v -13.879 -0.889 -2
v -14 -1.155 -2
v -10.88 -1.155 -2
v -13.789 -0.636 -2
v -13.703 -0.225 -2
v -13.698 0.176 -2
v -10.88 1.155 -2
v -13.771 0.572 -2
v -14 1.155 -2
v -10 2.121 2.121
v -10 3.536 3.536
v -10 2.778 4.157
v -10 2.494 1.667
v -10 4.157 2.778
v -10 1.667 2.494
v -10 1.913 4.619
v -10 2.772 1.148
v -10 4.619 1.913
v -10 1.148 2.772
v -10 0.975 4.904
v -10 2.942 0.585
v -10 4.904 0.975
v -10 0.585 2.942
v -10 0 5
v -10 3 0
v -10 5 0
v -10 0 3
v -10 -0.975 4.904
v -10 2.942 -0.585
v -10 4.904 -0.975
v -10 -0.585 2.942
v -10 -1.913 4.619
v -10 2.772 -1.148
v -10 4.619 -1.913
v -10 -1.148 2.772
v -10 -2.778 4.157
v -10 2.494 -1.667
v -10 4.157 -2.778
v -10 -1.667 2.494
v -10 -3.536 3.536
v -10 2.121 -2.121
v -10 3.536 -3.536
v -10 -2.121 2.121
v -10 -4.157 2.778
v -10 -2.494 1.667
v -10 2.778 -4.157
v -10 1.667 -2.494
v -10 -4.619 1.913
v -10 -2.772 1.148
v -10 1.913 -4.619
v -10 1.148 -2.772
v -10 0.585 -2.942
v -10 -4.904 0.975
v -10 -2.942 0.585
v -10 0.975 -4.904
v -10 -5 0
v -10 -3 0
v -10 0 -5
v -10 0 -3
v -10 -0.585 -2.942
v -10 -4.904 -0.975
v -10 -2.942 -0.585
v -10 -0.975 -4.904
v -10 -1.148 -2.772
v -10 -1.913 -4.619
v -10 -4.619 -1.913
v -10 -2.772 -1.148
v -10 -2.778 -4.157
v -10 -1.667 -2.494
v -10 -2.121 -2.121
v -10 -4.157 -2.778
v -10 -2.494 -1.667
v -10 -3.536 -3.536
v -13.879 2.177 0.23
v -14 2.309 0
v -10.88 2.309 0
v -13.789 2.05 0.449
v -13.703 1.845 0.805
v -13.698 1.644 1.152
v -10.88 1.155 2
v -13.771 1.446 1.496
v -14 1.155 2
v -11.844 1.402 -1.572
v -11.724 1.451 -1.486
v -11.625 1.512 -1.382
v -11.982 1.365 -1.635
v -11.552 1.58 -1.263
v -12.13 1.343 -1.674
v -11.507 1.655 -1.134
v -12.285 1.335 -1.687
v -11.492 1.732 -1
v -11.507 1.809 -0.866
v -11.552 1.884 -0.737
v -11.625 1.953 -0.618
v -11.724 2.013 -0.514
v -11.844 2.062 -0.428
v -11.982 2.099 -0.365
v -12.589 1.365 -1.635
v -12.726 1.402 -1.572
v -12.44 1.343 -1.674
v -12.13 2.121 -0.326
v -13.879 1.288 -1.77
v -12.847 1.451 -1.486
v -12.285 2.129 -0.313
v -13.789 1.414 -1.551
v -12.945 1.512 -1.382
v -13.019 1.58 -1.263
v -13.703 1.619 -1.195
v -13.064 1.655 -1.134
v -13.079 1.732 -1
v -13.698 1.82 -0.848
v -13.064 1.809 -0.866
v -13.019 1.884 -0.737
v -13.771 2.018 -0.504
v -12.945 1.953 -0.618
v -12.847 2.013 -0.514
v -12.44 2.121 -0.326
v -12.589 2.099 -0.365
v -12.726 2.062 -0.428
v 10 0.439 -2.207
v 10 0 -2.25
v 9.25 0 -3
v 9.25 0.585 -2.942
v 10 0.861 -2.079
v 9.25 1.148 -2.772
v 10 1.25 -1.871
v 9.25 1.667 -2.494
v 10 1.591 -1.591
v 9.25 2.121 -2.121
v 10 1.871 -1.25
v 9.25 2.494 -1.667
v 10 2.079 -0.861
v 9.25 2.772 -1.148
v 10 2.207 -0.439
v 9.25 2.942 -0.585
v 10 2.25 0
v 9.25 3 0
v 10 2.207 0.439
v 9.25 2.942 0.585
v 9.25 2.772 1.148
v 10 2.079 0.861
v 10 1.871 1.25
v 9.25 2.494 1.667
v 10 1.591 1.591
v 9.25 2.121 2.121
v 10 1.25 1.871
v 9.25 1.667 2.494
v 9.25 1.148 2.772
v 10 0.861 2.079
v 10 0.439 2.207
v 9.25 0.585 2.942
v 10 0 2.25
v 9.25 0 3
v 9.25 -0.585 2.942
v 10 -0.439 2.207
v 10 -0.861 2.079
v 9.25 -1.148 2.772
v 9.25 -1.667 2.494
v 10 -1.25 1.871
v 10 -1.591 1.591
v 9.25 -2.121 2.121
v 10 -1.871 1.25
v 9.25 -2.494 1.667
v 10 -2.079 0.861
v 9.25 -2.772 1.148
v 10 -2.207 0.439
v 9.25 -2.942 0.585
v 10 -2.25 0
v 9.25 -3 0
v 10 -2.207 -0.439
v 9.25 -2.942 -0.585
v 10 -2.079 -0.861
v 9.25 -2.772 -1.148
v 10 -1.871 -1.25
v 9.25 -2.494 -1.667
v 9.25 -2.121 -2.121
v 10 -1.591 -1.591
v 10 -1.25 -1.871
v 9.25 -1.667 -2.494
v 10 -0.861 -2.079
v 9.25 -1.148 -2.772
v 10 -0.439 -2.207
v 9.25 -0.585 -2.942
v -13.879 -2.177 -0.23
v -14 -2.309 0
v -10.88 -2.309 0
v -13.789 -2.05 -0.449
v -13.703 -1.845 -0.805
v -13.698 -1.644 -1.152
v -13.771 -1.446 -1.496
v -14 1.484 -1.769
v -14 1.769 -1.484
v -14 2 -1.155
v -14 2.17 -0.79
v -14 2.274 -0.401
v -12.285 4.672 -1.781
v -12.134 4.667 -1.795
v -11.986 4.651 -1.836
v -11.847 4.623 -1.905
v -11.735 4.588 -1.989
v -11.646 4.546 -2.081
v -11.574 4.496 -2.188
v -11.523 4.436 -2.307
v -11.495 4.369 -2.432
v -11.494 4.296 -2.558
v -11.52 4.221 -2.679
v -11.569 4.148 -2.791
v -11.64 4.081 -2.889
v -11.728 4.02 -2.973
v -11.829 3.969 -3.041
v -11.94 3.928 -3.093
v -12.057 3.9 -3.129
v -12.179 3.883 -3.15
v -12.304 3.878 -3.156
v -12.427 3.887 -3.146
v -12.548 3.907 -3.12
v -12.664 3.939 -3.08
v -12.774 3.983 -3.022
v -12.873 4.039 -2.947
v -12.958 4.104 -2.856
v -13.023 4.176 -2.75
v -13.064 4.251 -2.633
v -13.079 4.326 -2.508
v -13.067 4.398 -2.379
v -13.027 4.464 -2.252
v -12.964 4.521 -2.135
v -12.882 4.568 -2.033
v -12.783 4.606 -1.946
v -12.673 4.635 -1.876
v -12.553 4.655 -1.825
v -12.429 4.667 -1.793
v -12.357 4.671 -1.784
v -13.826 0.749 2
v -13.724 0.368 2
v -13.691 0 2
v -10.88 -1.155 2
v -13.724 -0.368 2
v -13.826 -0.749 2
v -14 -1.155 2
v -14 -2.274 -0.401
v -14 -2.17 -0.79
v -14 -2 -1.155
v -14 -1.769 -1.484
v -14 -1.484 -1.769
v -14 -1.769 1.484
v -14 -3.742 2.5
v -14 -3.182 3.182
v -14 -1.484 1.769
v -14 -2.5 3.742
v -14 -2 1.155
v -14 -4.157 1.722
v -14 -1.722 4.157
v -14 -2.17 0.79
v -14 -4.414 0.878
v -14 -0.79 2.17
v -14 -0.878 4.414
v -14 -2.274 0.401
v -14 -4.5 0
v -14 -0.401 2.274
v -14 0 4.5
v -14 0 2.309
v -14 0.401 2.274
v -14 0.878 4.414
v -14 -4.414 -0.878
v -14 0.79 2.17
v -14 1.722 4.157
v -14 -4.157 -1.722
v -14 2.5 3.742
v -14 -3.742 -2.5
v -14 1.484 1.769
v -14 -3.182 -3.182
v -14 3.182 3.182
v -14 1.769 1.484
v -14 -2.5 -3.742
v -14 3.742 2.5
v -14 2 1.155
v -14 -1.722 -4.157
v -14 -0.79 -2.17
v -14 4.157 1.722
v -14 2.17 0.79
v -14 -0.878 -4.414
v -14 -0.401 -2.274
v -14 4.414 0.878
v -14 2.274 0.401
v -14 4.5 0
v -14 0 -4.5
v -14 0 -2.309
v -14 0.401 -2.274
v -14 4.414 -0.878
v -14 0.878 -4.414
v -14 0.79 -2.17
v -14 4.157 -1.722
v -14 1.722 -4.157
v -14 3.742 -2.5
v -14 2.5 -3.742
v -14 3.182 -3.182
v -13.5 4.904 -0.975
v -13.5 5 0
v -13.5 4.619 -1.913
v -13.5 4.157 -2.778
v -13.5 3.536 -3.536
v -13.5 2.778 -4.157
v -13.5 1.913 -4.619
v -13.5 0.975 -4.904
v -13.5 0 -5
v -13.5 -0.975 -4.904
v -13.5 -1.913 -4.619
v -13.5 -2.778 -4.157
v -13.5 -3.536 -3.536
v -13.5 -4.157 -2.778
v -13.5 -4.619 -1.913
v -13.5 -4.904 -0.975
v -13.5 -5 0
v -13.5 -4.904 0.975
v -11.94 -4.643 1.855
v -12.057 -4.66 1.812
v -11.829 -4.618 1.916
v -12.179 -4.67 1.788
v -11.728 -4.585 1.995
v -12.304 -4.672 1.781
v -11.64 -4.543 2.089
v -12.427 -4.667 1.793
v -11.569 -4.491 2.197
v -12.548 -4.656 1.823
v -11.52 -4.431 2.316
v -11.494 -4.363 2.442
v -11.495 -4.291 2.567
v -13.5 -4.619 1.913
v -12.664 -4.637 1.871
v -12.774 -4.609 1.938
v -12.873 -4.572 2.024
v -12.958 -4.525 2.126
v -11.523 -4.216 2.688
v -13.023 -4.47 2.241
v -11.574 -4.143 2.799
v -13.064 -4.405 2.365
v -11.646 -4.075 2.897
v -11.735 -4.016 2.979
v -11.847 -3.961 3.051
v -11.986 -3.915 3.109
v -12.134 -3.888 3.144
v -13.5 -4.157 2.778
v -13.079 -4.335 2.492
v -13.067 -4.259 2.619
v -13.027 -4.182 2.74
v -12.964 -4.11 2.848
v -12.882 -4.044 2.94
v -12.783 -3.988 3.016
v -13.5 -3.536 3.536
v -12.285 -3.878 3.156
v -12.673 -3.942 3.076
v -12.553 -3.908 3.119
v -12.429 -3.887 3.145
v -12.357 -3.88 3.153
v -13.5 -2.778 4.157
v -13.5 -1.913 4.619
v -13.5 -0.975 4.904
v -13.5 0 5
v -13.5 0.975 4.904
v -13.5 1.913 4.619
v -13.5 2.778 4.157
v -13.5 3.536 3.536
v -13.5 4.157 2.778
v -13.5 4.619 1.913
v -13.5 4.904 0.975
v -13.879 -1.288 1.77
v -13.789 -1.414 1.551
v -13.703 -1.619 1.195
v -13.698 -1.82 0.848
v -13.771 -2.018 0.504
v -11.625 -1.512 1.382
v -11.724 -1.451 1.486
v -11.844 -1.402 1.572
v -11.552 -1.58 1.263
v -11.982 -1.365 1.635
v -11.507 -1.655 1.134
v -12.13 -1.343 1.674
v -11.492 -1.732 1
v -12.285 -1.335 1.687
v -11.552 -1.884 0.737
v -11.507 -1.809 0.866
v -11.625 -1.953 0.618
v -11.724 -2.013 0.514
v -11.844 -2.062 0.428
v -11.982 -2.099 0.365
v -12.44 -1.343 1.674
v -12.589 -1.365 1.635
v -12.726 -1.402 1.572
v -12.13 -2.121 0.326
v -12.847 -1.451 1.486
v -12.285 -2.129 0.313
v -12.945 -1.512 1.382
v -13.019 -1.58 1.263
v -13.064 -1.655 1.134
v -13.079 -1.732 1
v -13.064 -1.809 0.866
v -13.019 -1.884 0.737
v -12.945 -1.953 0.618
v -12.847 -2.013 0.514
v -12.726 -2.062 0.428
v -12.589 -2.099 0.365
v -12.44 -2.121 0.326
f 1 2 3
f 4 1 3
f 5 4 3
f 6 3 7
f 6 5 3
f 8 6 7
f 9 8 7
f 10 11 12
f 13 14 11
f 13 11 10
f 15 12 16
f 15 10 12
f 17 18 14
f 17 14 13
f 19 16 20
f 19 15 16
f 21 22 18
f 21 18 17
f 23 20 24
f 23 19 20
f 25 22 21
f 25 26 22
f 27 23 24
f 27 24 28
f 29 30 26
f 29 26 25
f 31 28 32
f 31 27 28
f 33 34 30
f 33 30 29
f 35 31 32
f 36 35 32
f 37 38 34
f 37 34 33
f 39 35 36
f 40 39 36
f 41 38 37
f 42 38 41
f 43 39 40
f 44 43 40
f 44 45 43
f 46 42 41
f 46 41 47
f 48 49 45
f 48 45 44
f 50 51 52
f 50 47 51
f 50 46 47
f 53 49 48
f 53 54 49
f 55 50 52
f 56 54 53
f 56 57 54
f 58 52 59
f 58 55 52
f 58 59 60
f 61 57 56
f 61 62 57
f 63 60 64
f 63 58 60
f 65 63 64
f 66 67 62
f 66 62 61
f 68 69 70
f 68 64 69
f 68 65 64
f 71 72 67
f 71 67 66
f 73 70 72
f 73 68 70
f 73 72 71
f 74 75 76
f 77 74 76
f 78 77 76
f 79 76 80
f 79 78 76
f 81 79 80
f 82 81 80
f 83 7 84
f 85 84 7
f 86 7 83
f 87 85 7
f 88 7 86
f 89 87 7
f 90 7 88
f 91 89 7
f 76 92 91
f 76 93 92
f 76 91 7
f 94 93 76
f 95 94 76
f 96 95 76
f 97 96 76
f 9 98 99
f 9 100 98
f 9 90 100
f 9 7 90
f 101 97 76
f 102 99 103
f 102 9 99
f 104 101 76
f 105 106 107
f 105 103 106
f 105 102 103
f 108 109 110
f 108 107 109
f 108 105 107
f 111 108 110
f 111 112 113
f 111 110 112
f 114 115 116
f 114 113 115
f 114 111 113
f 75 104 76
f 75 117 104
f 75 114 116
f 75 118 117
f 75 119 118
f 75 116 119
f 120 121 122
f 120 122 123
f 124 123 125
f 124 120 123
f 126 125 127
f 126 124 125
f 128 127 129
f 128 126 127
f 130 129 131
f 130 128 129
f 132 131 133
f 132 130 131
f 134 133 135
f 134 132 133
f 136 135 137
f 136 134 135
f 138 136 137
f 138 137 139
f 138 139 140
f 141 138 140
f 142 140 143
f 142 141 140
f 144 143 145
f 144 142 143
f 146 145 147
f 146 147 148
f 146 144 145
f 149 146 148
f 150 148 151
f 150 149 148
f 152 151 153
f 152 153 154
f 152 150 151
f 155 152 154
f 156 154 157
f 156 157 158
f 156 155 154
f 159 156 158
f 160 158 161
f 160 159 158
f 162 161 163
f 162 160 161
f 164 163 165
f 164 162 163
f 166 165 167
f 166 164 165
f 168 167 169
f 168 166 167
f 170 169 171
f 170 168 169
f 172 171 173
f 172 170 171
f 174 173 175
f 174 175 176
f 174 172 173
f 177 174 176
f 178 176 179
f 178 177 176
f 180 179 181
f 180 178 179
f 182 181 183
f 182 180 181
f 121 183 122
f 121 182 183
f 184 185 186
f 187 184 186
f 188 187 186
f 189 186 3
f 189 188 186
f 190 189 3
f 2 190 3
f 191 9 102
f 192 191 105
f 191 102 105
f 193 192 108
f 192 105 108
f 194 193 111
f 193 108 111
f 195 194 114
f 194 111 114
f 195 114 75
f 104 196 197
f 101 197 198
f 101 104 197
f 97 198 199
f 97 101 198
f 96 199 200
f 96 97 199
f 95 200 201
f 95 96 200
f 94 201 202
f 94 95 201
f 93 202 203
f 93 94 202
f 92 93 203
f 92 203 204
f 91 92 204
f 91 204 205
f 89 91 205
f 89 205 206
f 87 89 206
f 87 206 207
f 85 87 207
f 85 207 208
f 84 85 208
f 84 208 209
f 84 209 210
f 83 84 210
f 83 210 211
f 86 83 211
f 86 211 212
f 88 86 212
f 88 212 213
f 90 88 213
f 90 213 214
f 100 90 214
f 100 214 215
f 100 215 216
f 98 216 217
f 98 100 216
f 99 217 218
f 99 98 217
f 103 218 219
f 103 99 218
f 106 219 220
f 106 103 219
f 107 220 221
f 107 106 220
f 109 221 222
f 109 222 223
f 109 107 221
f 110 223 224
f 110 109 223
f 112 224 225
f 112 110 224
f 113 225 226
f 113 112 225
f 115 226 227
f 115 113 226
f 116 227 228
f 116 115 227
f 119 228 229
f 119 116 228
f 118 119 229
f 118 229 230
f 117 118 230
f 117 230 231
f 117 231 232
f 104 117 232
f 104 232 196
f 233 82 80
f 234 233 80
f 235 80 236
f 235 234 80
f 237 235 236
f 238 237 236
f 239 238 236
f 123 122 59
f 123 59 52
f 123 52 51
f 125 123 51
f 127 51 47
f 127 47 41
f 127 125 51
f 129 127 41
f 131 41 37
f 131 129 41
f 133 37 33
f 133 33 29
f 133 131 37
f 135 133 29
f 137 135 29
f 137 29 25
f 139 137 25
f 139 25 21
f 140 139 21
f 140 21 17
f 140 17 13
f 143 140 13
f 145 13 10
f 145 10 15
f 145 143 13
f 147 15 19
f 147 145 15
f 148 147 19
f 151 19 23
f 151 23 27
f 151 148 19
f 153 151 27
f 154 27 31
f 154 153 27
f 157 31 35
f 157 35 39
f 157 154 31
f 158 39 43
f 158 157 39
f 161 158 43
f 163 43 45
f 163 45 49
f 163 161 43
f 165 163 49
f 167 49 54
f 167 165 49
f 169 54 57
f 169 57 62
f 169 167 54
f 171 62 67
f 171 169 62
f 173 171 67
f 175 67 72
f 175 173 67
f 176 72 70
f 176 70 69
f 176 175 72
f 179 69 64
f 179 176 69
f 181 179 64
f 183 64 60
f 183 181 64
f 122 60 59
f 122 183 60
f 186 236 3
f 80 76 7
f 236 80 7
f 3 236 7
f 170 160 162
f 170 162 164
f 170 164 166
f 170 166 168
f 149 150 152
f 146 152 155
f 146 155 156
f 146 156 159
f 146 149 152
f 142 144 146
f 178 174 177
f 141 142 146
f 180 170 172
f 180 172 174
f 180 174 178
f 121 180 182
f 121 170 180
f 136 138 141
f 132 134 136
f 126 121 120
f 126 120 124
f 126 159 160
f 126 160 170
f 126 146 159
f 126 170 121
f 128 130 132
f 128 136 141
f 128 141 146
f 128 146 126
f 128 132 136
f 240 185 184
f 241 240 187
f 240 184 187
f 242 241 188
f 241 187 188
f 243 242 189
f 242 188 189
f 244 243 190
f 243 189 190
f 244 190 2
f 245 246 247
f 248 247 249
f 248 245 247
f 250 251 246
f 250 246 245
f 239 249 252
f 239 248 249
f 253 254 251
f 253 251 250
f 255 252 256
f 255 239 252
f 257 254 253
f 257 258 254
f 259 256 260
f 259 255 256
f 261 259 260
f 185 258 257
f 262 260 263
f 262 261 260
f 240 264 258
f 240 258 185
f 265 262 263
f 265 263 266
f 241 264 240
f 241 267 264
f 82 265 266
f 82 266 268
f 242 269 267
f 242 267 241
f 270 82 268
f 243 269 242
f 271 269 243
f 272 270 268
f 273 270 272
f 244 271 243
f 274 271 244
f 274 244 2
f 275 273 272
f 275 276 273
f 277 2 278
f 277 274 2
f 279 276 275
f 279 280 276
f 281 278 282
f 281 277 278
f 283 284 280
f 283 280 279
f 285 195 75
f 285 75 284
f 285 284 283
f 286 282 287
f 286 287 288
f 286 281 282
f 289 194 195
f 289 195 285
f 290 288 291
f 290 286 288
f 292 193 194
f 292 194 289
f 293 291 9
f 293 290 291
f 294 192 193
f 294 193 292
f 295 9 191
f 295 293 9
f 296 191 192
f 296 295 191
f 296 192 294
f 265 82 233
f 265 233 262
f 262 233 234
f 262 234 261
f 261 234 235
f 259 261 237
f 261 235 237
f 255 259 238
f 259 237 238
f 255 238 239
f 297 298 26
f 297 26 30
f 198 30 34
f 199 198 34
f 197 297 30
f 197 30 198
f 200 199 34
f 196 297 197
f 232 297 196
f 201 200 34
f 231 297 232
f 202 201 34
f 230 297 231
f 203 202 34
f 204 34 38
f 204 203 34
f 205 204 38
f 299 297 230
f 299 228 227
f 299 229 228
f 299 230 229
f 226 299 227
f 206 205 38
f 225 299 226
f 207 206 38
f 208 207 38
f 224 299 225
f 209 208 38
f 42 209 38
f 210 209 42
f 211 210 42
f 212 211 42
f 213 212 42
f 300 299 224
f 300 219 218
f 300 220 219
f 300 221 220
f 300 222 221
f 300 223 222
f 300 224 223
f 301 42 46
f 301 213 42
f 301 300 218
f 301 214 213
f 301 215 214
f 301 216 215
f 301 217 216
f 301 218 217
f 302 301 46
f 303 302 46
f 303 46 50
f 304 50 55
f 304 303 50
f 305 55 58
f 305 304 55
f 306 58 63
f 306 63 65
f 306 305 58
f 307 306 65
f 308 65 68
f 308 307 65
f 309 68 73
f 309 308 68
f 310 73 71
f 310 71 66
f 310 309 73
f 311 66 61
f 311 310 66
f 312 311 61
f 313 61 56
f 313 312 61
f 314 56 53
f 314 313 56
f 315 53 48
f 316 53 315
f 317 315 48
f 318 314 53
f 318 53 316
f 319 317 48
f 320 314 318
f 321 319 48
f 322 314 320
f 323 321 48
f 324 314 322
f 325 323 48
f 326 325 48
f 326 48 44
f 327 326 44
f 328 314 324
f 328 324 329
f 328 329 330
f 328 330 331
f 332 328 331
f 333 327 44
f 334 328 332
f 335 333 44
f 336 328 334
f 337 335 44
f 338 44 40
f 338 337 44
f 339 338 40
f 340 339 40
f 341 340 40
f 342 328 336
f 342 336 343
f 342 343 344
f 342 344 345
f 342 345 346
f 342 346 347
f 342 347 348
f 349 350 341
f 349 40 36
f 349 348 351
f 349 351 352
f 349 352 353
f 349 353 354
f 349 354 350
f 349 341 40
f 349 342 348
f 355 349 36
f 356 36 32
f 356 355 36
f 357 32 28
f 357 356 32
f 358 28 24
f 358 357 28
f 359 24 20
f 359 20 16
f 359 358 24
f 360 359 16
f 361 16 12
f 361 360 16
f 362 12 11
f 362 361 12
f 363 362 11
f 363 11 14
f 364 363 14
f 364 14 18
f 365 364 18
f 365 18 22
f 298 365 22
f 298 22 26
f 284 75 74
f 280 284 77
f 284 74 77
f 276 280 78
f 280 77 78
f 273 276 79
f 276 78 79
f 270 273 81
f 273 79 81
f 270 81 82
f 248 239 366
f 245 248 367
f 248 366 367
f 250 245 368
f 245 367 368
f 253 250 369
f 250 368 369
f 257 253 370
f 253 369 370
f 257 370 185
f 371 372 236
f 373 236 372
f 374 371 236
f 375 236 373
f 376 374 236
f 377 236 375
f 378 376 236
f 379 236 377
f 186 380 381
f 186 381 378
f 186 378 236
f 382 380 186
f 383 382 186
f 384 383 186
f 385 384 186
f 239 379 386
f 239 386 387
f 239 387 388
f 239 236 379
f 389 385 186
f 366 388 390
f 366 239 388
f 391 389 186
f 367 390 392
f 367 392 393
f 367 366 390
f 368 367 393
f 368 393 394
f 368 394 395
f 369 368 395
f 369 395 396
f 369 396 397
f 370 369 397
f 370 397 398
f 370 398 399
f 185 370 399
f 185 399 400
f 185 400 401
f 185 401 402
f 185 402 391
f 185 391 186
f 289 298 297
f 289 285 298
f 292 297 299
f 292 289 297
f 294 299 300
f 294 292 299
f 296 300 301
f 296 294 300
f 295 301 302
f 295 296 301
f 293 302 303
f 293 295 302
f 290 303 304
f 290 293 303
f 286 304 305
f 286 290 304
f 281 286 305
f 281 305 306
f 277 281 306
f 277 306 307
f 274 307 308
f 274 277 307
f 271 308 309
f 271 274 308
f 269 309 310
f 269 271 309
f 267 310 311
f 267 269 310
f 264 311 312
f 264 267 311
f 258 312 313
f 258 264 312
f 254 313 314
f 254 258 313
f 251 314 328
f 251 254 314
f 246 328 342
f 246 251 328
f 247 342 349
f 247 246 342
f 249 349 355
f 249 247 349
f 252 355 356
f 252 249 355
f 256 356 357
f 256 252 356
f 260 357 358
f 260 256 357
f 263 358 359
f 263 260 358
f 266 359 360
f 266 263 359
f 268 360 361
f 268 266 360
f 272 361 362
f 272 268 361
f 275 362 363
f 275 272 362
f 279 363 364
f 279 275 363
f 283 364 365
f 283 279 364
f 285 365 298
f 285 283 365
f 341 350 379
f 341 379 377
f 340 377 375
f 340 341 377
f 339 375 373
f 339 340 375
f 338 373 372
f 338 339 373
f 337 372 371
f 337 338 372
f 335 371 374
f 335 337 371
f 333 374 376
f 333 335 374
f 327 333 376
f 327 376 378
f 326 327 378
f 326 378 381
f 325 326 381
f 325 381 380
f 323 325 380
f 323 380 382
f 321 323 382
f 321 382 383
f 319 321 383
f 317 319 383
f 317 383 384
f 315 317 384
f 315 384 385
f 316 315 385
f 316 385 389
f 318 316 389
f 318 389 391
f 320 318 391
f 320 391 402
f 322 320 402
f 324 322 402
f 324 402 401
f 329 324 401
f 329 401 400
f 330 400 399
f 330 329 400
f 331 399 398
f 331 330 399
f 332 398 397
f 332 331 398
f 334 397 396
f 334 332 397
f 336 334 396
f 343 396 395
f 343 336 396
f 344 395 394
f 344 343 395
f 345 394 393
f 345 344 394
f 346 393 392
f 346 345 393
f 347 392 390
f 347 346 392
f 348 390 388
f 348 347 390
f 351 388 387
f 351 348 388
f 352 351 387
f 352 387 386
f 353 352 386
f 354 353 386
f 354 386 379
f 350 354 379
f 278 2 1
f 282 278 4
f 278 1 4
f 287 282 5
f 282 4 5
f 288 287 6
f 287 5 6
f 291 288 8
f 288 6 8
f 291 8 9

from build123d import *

# Parameters (mm, degrees)
SKETCH2_R               = 3
BOSS_EXTRUDE1_DEPTH     = 20
CHAMFER1_SIZE           = 0.75
CUT_EXTRUDE1_DEPTH      = 3.12
CUT_EXTRUDE3_DEPTH      = 17.652942925
CUT_EXTRUDE3_DEPTH_BACK = 17.652942925
SKETCH9_R               = 0.79375


with BuildPart() as part:
    # Sketch2 → Boss-Extrude1 (new body)
    with BuildSketch(Plane(origin=(10, 0, 0), x_dir=(0, 0, -1), z_dir=(1, 0, 0))):
        Circle(SKETCH2_R)
    extrude(amount=-BOSS_EXTRUDE1_DEPTH)

    # Chamfer1
    chamfer1_edges = [part.edges().sort_by_distance(p)[0] for p in [
        (10, 0, 3),
    ]]
    chamfer(chamfer1_edges, length=CHAMFER1_SIZE)

    # Sketch6 → Revolve1 (revolve)
    with BuildSketch(Plane.XY):
        Polygon((-13.5, 5), (-14, 4.5), (-14, 0), (-10, 0), (-10, 5), align=None)
    revolve(axis=Axis((-10, 0, 0), (-1, 0, 0)))

    # Sketch4 → Cut-Extrude1 (cut)
    with BuildSketch(Plane(origin=(-14, 0, 0), x_dir=(0, 0, -1), z_dir=(1, 0, 0))):
        Polygon((0, 2.309401077), (-2, 1.154700538), (-2, -1.154700538), (0, -2.309401077), (2, -1.154700538), (2, 1.154700538), align=None)
    extrude(amount=CUT_EXTRUDE1_DEPTH, mode=Mode.SUBTRACT)

    # Cut-Extrude2 cone 1 section (through the dimple's axis) → Cut-Extrude2 (revolve, cut)
    with BuildSketch(Plane(origin=(-14, 0, 0), x_dir=(0, 0, 1), z_dir=(0, 1, 0))):
        Polygon((0, 0), (2.309401077, 0), (0, 2.309401077), align=None)
    revolve(axis=Axis((-14, 0, 0), (1, 0, 0)), mode=Mode.SUBTRACT)

    # Sketch9 → Cut-Extrude3 (cut, two sides: drawn at the far end of the back side and taken through both)
    with BuildSketch(Plane(origin=(0, -1.732050808, 1), x_dir=(1, 0, 0), z_dir=(0, 0.8660254037844387, -0.49999999999999983)).offset(-CUT_EXTRUDE3_DEPTH_BACK)):
        with Locations(Location((-12.285299496, 0, 0), (0, 0, 270))):
            Circle(SKETCH9_R)
    extrude(amount=CUT_EXTRUDE3_DEPTH + CUT_EXTRUDE3_DEPTH_BACK, mode=Mode.SUBTRACT)


solid = part.part
